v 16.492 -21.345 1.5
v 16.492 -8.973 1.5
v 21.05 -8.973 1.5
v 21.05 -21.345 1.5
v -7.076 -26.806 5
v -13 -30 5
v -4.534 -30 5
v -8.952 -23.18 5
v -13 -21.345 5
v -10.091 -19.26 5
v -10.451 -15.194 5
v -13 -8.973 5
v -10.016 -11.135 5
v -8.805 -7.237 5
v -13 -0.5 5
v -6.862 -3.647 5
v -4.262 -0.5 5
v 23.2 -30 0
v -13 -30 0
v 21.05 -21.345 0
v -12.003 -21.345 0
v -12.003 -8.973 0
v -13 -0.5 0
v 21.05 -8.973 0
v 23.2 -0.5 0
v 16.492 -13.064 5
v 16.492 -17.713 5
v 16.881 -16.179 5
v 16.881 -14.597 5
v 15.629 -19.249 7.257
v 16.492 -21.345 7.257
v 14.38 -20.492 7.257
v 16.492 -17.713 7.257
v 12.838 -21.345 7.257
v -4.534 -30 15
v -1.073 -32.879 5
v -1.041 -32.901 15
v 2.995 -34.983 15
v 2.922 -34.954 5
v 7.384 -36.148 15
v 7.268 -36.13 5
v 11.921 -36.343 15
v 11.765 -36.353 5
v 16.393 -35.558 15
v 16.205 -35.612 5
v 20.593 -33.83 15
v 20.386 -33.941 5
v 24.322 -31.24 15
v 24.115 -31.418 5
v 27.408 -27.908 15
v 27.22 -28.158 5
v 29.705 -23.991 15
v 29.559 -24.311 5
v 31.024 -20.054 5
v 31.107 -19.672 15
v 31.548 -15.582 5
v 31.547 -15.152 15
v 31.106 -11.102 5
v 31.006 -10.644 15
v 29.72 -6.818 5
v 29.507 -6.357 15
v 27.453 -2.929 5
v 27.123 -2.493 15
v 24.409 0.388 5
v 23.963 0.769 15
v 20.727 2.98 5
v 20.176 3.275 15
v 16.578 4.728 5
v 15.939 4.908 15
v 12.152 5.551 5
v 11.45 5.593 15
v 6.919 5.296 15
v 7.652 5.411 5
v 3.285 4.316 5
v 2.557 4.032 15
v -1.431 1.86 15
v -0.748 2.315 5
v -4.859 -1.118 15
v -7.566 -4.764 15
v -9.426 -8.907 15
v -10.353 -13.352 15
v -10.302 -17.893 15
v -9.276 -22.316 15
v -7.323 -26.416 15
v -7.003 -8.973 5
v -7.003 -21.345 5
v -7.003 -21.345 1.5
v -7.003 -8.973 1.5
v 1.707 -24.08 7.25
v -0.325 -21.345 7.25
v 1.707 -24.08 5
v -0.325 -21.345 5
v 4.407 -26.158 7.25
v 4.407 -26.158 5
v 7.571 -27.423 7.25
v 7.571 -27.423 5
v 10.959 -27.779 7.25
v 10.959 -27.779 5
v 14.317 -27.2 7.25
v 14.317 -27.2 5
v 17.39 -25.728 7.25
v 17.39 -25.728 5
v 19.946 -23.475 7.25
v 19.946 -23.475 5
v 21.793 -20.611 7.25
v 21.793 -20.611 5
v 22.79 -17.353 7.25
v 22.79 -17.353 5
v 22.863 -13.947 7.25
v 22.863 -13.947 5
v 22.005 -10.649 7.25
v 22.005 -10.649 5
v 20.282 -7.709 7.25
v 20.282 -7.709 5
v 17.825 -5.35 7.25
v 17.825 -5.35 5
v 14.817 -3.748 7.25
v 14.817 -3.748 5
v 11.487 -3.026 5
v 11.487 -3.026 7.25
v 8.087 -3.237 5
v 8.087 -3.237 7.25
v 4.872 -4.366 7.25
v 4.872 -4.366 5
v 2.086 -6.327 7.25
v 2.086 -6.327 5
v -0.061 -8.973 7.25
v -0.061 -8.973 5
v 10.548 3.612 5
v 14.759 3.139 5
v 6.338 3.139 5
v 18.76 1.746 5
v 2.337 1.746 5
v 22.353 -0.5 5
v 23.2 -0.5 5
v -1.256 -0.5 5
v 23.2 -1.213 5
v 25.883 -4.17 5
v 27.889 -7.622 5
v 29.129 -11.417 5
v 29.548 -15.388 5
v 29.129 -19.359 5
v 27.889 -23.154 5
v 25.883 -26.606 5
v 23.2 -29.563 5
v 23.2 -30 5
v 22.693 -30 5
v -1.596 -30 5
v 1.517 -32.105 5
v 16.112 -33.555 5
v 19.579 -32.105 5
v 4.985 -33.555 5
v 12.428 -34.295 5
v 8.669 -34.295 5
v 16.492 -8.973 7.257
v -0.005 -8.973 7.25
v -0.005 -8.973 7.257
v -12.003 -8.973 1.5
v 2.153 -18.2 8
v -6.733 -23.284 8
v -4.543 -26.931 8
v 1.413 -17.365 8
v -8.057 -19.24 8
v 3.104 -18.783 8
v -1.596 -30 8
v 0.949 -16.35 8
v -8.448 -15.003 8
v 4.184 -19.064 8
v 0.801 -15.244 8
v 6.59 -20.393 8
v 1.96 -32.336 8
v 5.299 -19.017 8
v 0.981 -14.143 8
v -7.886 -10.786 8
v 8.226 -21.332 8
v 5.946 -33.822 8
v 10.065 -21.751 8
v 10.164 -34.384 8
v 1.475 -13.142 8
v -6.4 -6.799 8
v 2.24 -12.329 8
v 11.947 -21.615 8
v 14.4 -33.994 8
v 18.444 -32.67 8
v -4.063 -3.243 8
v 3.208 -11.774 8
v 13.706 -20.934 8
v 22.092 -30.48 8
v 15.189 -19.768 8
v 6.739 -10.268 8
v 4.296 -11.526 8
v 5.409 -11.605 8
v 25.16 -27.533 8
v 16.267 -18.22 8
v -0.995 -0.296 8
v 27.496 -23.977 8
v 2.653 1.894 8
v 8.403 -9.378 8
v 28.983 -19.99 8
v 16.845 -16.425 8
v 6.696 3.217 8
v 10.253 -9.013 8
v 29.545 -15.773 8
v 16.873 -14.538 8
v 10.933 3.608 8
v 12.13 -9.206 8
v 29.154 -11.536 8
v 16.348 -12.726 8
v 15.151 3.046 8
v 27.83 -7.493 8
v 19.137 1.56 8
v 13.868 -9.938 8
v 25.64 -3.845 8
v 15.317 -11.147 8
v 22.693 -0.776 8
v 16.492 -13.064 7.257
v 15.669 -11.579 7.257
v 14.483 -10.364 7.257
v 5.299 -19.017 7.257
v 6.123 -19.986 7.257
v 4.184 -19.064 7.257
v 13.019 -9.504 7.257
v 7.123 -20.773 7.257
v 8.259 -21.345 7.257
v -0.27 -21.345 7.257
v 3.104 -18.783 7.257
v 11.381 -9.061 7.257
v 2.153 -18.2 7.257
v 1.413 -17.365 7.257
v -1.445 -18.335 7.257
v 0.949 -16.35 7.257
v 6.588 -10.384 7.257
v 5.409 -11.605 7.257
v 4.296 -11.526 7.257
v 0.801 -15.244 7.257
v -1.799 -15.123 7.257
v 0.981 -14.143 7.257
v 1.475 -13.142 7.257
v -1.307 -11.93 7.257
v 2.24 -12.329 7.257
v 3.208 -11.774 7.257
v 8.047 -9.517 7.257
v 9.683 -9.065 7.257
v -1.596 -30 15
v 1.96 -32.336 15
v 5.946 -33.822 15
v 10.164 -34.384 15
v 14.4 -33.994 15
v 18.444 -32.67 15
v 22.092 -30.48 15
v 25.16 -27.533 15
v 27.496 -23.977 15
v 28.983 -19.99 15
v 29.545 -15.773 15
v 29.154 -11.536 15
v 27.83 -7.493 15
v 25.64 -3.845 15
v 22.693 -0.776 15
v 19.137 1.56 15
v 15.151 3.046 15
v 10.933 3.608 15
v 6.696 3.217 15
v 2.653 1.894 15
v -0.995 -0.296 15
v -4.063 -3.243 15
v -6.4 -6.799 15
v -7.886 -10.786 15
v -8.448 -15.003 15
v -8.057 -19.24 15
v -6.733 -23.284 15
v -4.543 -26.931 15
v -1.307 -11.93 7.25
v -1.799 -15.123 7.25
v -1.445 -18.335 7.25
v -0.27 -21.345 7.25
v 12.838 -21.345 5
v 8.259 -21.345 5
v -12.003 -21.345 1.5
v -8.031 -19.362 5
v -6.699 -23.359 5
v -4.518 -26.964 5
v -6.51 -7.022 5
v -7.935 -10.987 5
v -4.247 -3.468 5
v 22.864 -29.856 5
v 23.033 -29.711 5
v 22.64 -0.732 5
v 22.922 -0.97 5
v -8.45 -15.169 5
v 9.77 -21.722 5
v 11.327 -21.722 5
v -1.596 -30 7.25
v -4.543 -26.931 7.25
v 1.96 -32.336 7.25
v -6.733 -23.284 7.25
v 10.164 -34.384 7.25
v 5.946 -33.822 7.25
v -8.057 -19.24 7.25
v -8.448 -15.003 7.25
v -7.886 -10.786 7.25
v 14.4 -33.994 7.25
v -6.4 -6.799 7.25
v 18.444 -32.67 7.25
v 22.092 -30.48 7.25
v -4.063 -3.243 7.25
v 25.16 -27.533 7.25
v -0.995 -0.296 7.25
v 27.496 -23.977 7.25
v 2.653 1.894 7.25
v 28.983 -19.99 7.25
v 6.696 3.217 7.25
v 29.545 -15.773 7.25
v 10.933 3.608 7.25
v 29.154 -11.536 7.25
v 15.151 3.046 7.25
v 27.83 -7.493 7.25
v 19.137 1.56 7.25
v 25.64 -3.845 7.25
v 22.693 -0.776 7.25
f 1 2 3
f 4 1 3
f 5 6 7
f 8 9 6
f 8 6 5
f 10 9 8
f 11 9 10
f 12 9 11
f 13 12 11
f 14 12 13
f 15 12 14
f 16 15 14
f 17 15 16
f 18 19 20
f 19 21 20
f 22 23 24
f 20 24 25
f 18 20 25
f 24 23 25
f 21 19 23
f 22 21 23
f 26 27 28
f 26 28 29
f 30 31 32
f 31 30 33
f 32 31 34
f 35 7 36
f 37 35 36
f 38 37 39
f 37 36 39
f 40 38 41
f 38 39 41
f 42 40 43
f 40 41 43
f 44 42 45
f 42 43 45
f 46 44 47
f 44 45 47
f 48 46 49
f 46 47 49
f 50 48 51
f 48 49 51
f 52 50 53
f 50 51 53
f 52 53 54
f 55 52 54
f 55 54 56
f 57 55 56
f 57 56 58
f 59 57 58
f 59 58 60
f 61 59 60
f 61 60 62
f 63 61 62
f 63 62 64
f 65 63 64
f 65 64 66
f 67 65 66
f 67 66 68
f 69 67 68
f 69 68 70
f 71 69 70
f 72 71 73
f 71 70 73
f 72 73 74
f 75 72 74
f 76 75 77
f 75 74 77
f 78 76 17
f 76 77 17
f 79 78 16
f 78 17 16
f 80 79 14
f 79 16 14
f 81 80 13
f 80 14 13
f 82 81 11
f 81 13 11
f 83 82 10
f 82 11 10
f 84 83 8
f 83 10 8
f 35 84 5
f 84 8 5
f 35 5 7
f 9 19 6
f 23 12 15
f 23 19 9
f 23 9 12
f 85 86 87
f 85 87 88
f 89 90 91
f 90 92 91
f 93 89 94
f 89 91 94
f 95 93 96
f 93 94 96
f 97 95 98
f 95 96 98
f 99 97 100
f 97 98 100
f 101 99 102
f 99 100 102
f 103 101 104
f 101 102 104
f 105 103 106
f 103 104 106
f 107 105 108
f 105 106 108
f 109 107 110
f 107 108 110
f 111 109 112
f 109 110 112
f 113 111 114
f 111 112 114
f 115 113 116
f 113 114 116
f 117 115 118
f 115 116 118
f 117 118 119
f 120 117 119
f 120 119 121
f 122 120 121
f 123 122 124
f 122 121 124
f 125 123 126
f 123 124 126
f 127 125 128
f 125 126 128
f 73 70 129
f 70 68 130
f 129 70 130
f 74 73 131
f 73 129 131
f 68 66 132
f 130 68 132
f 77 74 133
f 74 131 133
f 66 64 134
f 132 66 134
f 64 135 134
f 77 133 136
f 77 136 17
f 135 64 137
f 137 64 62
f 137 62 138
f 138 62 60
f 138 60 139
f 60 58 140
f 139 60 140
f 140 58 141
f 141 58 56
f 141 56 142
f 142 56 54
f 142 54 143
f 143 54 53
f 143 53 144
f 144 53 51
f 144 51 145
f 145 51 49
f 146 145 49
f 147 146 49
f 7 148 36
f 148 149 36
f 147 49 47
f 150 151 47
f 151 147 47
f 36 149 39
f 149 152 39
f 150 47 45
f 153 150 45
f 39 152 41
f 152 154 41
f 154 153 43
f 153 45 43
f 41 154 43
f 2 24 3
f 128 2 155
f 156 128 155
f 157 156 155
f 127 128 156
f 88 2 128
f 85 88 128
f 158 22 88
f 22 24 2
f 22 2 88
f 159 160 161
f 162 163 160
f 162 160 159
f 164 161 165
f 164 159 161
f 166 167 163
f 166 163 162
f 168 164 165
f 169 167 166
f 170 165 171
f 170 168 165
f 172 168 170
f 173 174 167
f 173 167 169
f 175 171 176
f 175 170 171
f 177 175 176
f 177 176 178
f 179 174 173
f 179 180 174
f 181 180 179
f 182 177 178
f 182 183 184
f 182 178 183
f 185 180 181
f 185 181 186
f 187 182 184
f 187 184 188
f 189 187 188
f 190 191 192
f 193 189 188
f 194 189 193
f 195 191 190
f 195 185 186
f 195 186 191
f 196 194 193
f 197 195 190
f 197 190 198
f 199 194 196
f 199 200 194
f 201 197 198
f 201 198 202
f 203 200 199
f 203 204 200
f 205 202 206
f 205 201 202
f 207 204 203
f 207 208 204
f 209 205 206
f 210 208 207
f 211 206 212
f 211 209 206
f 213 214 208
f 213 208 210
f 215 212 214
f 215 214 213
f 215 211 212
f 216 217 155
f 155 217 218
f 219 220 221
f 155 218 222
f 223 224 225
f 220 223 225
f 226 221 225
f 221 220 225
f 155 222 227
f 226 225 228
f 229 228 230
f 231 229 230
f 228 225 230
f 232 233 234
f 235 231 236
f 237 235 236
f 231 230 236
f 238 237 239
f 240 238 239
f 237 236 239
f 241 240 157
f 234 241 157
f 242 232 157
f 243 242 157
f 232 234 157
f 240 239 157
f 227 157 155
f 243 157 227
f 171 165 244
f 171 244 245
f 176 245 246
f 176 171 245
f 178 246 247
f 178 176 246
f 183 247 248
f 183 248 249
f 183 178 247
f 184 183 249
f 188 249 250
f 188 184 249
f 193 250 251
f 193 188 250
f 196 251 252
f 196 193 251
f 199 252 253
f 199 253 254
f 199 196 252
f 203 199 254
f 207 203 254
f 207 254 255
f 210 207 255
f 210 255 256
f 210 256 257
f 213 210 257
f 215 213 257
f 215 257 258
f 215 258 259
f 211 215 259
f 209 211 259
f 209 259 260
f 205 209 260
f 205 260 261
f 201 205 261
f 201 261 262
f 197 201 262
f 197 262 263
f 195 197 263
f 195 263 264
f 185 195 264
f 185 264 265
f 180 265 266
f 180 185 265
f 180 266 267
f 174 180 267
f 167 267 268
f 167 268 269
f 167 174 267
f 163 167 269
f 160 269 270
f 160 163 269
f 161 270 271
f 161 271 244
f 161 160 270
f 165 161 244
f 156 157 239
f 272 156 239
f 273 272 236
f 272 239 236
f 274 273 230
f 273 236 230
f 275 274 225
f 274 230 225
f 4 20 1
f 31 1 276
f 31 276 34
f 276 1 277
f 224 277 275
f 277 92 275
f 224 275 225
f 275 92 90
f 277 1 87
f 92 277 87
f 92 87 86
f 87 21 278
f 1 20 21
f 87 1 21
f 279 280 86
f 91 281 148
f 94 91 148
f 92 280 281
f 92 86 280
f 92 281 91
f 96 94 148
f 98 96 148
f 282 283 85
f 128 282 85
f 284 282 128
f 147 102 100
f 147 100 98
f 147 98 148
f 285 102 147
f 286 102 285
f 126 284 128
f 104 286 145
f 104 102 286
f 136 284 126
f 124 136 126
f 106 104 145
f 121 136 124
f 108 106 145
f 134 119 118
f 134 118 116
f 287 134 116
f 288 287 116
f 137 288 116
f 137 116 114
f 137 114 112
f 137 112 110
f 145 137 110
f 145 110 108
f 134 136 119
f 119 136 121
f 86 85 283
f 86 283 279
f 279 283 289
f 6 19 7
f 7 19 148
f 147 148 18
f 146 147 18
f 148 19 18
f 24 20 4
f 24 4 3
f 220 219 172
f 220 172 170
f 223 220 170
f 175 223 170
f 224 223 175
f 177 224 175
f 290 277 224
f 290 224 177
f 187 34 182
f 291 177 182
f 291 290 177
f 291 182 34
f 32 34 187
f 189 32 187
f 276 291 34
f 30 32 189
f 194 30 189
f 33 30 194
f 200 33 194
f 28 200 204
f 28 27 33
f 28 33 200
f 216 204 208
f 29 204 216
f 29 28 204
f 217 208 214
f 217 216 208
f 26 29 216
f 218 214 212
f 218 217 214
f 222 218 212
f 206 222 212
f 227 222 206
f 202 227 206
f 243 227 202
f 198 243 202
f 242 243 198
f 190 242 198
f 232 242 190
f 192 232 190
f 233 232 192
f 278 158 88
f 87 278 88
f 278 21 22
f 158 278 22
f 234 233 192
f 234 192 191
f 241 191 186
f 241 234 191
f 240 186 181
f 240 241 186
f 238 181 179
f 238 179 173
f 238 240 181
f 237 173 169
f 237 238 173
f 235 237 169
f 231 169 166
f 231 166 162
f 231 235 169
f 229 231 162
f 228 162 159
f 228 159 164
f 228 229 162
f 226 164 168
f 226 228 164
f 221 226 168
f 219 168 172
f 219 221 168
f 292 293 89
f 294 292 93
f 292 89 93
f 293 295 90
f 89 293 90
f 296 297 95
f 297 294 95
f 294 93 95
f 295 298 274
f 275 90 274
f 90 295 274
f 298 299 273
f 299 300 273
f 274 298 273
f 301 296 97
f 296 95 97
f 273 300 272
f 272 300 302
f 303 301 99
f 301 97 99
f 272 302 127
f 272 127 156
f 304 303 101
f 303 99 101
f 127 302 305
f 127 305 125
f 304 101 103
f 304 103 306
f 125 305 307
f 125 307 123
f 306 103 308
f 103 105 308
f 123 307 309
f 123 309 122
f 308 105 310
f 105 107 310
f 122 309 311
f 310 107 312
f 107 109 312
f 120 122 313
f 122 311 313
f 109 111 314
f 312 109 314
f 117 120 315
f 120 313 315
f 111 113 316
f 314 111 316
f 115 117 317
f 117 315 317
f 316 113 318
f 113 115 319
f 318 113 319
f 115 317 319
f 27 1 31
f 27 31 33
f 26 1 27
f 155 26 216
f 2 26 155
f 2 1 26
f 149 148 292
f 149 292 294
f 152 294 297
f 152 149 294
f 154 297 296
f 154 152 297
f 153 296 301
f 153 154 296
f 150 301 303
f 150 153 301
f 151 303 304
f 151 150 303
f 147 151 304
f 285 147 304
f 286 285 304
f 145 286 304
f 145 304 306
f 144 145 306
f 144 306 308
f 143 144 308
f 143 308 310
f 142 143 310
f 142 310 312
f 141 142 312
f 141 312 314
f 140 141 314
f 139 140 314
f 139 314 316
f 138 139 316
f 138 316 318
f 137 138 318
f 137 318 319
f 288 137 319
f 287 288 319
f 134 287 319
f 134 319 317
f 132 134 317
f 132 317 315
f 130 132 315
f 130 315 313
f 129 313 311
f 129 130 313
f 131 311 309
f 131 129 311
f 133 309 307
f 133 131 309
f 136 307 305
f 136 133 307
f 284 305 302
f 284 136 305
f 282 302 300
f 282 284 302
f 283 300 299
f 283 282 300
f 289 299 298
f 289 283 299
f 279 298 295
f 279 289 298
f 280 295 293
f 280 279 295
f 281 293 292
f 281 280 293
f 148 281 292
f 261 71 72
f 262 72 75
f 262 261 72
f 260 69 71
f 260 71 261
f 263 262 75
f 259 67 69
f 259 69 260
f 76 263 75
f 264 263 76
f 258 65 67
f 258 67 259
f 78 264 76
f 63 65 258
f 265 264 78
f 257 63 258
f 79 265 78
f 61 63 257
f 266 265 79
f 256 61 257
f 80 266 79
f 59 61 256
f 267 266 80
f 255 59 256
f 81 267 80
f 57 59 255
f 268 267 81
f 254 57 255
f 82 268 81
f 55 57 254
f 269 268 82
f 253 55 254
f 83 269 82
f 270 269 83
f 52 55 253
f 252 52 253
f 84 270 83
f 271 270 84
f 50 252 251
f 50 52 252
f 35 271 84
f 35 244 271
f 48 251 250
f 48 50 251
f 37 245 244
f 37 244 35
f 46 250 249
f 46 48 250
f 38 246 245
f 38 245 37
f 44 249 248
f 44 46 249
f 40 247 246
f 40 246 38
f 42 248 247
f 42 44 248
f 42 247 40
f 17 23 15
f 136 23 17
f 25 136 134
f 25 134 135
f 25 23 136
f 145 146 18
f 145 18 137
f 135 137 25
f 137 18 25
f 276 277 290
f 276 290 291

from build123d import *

# Parameters (mm, degrees)
ESQUISSE1_W             = 36.200001836
ESQUISSE1_H             = 29.499999305
BOSS_EXTRU_1_DEPTH      = 5
ESQUISSE2_W             = 33.052998595
ESQUISSE2_H             = 12.371999211
ENL_V_MAT_EXTRU_1_DEPTH = 5
BOSS_EXTRU_2_START      = 5
ESQUISSE3_W             = 4.558359629
ESQUISSE3_H             = 12.371999211
ESQUISSE3_W_2           = 4.999999888
ESQUISSE3_H_2           = 12.380001135
BOSS_EXTRU_2_DEPTH      = 3.5
BOSS_EXTRU_5_DEPTH      = 2
BOSS_EXTRU_5_DEPTH_BACK = 1
BOSS_EXTRU_5_START      = 6
ESQUISSE4_R             = 12.398139185
ENL_V_MAT_EXTRU_3_REACH = 49.691
ESQUISSE6_W             = 2.256513492
ESQUISSE6_H             = 12.371999211
SKETCH4_R               = 21
SKETCH4_R_2             = 19
BOSS_EXTRUDE2_DEPTH     = 10
SKETCH5_R               = 20
SKETCH5_R_2             = 12.35
BOSS_EXTRUDE7_DEPTH     = 0.75


with BuildPart() as part:
    # Esquisse1 → Boss.-Extru.1 (new body)
    with BuildSketch(Plane.XY):
        with Locations((5.10000065, -15.249999676)):
            Rectangle(ESQUISSE1_W, ESQUISSE1_H)
    extrude(amount=BOSS_EXTRU_1_DEPTH)

    # Esquisse2 → Enlèv. mat.-Extru.1 (cut)
    with BuildSketch(Plane.XY):
        with Locations((4.523499403, -15.158999246)):
            Rectangle(ESQUISSE2_W, ESQUISSE2_H)
    extrude(amount=ENL_V_MAT_EXTRU_1_DEPTH, mode=Mode.SUBTRACT)

    # Esquisse3 → Boss.-Extru.2 (add)
    with BuildSketch(Plane.XY.offset(BOSS_EXTRU_2_START)):
        with Locations((18.770818887, -15.158999246)):
            Rectangle(ESQUISSE3_W, ESQUISSE3_H)
        with Locations((-9.50299995, -15.163000208)):
            Rectangle(ESQUISSE3_W_2, ESQUISSE3_H_2)
    extrude(amount=-BOSS_EXTRU_2_DEPTH)

    # Esquisse4 → Boss.-Extru.5 (add, two sides: drawn at the far end of the back side and taken through both)
    with BuildSketch(Plane.XY.offset(BOSS_EXTRU_5_START - BOSS_EXTRU_5_DEPTH_BACK)):
        with Locations((10.5484362, -15.38812394)):
            Circle(ESQUISSE4_R)
        with BuildLine():
            ThreePointArc((5.299216058, -19.01722353), (16.929328279, -15.482422447), (5.408748548, -11.605494329))
            ThreePointArc((5.408748548, -11.605494329), (0.800592824, -15.244067738), (5.299216058, -19.01722353))
        make_face(mode=Mode.SUBTRACT)
    extrude(amount=BOSS_EXTRU_5_DEPTH + BOSS_EXTRU_5_DEPTH_BACK)

    # Enlèv. mat.-Extru.3: up to this face of the body (flat: up to its plane)
    enl_v_mat_extru_3_end = Plane(part.part.faces().sort_by_distance((16.491639072, -15.158999246, 3.25))[0])
    # Esquisse6 → Enlèv. mat.-Extru.3 (cut, up to the picked face)
    with BuildSketch(Plane.ZY.offset(13.000000268), mode=Mode.PRIVATE) as enl_v_mat_extru_3_sk1:
        with Locations((6.128256634, -15.158999246)):
            Rectangle(ESQUISSE6_W, ESQUISSE6_H)
    enl_v_mat_extru_3_tool1 = split(extrude(enl_v_mat_extru_3_sk1.sketch, amount=-ENL_V_MAT_EXTRU_3_REACH, mode=Mode.PRIVATE), bisect_by=enl_v_mat_extru_3_end, keep=Keep.BOTH, mode=Mode.PRIVATE)
    add(enl_v_mat_extru_3_tool1.solids().sort_by(Axis((-13, -15.158999, 6.128257), (1, 0, 0)))[0], mode=Mode.SUBTRACT)

    # Sketch4 → Boss-Extrude2 (add)
    with BuildSketch(Plane.XY.offset(5)):
        with Locations(Location((10.5484362, -15.38812394, 0), (0, 0, 224.09128758))):
            Circle(SKETCH4_R)
        with Locations(Location((10.5484362, -15.38812394, 0), (0, 0, 230.268304167))):
            Circle(SKETCH4_R_2, mode=Mode.SUBTRACT)
    extrude(amount=BOSS_EXTRUDE2_DEPTH)

    # Sketch5 → Boss-Extrude7 (add)
    with BuildSketch(Plane.XY.offset(8)):
        with Locations((10.5484362, -15.38812394)):
            Circle(SKETCH5_R)
        with Locations((10.5484362, -15.38812394)):
            Circle(SKETCH5_R_2, mode=Mode.SUBTRACT)
    extrude(amount=-BOSS_EXTRUDE7_DEPTH)


solid = part.part
